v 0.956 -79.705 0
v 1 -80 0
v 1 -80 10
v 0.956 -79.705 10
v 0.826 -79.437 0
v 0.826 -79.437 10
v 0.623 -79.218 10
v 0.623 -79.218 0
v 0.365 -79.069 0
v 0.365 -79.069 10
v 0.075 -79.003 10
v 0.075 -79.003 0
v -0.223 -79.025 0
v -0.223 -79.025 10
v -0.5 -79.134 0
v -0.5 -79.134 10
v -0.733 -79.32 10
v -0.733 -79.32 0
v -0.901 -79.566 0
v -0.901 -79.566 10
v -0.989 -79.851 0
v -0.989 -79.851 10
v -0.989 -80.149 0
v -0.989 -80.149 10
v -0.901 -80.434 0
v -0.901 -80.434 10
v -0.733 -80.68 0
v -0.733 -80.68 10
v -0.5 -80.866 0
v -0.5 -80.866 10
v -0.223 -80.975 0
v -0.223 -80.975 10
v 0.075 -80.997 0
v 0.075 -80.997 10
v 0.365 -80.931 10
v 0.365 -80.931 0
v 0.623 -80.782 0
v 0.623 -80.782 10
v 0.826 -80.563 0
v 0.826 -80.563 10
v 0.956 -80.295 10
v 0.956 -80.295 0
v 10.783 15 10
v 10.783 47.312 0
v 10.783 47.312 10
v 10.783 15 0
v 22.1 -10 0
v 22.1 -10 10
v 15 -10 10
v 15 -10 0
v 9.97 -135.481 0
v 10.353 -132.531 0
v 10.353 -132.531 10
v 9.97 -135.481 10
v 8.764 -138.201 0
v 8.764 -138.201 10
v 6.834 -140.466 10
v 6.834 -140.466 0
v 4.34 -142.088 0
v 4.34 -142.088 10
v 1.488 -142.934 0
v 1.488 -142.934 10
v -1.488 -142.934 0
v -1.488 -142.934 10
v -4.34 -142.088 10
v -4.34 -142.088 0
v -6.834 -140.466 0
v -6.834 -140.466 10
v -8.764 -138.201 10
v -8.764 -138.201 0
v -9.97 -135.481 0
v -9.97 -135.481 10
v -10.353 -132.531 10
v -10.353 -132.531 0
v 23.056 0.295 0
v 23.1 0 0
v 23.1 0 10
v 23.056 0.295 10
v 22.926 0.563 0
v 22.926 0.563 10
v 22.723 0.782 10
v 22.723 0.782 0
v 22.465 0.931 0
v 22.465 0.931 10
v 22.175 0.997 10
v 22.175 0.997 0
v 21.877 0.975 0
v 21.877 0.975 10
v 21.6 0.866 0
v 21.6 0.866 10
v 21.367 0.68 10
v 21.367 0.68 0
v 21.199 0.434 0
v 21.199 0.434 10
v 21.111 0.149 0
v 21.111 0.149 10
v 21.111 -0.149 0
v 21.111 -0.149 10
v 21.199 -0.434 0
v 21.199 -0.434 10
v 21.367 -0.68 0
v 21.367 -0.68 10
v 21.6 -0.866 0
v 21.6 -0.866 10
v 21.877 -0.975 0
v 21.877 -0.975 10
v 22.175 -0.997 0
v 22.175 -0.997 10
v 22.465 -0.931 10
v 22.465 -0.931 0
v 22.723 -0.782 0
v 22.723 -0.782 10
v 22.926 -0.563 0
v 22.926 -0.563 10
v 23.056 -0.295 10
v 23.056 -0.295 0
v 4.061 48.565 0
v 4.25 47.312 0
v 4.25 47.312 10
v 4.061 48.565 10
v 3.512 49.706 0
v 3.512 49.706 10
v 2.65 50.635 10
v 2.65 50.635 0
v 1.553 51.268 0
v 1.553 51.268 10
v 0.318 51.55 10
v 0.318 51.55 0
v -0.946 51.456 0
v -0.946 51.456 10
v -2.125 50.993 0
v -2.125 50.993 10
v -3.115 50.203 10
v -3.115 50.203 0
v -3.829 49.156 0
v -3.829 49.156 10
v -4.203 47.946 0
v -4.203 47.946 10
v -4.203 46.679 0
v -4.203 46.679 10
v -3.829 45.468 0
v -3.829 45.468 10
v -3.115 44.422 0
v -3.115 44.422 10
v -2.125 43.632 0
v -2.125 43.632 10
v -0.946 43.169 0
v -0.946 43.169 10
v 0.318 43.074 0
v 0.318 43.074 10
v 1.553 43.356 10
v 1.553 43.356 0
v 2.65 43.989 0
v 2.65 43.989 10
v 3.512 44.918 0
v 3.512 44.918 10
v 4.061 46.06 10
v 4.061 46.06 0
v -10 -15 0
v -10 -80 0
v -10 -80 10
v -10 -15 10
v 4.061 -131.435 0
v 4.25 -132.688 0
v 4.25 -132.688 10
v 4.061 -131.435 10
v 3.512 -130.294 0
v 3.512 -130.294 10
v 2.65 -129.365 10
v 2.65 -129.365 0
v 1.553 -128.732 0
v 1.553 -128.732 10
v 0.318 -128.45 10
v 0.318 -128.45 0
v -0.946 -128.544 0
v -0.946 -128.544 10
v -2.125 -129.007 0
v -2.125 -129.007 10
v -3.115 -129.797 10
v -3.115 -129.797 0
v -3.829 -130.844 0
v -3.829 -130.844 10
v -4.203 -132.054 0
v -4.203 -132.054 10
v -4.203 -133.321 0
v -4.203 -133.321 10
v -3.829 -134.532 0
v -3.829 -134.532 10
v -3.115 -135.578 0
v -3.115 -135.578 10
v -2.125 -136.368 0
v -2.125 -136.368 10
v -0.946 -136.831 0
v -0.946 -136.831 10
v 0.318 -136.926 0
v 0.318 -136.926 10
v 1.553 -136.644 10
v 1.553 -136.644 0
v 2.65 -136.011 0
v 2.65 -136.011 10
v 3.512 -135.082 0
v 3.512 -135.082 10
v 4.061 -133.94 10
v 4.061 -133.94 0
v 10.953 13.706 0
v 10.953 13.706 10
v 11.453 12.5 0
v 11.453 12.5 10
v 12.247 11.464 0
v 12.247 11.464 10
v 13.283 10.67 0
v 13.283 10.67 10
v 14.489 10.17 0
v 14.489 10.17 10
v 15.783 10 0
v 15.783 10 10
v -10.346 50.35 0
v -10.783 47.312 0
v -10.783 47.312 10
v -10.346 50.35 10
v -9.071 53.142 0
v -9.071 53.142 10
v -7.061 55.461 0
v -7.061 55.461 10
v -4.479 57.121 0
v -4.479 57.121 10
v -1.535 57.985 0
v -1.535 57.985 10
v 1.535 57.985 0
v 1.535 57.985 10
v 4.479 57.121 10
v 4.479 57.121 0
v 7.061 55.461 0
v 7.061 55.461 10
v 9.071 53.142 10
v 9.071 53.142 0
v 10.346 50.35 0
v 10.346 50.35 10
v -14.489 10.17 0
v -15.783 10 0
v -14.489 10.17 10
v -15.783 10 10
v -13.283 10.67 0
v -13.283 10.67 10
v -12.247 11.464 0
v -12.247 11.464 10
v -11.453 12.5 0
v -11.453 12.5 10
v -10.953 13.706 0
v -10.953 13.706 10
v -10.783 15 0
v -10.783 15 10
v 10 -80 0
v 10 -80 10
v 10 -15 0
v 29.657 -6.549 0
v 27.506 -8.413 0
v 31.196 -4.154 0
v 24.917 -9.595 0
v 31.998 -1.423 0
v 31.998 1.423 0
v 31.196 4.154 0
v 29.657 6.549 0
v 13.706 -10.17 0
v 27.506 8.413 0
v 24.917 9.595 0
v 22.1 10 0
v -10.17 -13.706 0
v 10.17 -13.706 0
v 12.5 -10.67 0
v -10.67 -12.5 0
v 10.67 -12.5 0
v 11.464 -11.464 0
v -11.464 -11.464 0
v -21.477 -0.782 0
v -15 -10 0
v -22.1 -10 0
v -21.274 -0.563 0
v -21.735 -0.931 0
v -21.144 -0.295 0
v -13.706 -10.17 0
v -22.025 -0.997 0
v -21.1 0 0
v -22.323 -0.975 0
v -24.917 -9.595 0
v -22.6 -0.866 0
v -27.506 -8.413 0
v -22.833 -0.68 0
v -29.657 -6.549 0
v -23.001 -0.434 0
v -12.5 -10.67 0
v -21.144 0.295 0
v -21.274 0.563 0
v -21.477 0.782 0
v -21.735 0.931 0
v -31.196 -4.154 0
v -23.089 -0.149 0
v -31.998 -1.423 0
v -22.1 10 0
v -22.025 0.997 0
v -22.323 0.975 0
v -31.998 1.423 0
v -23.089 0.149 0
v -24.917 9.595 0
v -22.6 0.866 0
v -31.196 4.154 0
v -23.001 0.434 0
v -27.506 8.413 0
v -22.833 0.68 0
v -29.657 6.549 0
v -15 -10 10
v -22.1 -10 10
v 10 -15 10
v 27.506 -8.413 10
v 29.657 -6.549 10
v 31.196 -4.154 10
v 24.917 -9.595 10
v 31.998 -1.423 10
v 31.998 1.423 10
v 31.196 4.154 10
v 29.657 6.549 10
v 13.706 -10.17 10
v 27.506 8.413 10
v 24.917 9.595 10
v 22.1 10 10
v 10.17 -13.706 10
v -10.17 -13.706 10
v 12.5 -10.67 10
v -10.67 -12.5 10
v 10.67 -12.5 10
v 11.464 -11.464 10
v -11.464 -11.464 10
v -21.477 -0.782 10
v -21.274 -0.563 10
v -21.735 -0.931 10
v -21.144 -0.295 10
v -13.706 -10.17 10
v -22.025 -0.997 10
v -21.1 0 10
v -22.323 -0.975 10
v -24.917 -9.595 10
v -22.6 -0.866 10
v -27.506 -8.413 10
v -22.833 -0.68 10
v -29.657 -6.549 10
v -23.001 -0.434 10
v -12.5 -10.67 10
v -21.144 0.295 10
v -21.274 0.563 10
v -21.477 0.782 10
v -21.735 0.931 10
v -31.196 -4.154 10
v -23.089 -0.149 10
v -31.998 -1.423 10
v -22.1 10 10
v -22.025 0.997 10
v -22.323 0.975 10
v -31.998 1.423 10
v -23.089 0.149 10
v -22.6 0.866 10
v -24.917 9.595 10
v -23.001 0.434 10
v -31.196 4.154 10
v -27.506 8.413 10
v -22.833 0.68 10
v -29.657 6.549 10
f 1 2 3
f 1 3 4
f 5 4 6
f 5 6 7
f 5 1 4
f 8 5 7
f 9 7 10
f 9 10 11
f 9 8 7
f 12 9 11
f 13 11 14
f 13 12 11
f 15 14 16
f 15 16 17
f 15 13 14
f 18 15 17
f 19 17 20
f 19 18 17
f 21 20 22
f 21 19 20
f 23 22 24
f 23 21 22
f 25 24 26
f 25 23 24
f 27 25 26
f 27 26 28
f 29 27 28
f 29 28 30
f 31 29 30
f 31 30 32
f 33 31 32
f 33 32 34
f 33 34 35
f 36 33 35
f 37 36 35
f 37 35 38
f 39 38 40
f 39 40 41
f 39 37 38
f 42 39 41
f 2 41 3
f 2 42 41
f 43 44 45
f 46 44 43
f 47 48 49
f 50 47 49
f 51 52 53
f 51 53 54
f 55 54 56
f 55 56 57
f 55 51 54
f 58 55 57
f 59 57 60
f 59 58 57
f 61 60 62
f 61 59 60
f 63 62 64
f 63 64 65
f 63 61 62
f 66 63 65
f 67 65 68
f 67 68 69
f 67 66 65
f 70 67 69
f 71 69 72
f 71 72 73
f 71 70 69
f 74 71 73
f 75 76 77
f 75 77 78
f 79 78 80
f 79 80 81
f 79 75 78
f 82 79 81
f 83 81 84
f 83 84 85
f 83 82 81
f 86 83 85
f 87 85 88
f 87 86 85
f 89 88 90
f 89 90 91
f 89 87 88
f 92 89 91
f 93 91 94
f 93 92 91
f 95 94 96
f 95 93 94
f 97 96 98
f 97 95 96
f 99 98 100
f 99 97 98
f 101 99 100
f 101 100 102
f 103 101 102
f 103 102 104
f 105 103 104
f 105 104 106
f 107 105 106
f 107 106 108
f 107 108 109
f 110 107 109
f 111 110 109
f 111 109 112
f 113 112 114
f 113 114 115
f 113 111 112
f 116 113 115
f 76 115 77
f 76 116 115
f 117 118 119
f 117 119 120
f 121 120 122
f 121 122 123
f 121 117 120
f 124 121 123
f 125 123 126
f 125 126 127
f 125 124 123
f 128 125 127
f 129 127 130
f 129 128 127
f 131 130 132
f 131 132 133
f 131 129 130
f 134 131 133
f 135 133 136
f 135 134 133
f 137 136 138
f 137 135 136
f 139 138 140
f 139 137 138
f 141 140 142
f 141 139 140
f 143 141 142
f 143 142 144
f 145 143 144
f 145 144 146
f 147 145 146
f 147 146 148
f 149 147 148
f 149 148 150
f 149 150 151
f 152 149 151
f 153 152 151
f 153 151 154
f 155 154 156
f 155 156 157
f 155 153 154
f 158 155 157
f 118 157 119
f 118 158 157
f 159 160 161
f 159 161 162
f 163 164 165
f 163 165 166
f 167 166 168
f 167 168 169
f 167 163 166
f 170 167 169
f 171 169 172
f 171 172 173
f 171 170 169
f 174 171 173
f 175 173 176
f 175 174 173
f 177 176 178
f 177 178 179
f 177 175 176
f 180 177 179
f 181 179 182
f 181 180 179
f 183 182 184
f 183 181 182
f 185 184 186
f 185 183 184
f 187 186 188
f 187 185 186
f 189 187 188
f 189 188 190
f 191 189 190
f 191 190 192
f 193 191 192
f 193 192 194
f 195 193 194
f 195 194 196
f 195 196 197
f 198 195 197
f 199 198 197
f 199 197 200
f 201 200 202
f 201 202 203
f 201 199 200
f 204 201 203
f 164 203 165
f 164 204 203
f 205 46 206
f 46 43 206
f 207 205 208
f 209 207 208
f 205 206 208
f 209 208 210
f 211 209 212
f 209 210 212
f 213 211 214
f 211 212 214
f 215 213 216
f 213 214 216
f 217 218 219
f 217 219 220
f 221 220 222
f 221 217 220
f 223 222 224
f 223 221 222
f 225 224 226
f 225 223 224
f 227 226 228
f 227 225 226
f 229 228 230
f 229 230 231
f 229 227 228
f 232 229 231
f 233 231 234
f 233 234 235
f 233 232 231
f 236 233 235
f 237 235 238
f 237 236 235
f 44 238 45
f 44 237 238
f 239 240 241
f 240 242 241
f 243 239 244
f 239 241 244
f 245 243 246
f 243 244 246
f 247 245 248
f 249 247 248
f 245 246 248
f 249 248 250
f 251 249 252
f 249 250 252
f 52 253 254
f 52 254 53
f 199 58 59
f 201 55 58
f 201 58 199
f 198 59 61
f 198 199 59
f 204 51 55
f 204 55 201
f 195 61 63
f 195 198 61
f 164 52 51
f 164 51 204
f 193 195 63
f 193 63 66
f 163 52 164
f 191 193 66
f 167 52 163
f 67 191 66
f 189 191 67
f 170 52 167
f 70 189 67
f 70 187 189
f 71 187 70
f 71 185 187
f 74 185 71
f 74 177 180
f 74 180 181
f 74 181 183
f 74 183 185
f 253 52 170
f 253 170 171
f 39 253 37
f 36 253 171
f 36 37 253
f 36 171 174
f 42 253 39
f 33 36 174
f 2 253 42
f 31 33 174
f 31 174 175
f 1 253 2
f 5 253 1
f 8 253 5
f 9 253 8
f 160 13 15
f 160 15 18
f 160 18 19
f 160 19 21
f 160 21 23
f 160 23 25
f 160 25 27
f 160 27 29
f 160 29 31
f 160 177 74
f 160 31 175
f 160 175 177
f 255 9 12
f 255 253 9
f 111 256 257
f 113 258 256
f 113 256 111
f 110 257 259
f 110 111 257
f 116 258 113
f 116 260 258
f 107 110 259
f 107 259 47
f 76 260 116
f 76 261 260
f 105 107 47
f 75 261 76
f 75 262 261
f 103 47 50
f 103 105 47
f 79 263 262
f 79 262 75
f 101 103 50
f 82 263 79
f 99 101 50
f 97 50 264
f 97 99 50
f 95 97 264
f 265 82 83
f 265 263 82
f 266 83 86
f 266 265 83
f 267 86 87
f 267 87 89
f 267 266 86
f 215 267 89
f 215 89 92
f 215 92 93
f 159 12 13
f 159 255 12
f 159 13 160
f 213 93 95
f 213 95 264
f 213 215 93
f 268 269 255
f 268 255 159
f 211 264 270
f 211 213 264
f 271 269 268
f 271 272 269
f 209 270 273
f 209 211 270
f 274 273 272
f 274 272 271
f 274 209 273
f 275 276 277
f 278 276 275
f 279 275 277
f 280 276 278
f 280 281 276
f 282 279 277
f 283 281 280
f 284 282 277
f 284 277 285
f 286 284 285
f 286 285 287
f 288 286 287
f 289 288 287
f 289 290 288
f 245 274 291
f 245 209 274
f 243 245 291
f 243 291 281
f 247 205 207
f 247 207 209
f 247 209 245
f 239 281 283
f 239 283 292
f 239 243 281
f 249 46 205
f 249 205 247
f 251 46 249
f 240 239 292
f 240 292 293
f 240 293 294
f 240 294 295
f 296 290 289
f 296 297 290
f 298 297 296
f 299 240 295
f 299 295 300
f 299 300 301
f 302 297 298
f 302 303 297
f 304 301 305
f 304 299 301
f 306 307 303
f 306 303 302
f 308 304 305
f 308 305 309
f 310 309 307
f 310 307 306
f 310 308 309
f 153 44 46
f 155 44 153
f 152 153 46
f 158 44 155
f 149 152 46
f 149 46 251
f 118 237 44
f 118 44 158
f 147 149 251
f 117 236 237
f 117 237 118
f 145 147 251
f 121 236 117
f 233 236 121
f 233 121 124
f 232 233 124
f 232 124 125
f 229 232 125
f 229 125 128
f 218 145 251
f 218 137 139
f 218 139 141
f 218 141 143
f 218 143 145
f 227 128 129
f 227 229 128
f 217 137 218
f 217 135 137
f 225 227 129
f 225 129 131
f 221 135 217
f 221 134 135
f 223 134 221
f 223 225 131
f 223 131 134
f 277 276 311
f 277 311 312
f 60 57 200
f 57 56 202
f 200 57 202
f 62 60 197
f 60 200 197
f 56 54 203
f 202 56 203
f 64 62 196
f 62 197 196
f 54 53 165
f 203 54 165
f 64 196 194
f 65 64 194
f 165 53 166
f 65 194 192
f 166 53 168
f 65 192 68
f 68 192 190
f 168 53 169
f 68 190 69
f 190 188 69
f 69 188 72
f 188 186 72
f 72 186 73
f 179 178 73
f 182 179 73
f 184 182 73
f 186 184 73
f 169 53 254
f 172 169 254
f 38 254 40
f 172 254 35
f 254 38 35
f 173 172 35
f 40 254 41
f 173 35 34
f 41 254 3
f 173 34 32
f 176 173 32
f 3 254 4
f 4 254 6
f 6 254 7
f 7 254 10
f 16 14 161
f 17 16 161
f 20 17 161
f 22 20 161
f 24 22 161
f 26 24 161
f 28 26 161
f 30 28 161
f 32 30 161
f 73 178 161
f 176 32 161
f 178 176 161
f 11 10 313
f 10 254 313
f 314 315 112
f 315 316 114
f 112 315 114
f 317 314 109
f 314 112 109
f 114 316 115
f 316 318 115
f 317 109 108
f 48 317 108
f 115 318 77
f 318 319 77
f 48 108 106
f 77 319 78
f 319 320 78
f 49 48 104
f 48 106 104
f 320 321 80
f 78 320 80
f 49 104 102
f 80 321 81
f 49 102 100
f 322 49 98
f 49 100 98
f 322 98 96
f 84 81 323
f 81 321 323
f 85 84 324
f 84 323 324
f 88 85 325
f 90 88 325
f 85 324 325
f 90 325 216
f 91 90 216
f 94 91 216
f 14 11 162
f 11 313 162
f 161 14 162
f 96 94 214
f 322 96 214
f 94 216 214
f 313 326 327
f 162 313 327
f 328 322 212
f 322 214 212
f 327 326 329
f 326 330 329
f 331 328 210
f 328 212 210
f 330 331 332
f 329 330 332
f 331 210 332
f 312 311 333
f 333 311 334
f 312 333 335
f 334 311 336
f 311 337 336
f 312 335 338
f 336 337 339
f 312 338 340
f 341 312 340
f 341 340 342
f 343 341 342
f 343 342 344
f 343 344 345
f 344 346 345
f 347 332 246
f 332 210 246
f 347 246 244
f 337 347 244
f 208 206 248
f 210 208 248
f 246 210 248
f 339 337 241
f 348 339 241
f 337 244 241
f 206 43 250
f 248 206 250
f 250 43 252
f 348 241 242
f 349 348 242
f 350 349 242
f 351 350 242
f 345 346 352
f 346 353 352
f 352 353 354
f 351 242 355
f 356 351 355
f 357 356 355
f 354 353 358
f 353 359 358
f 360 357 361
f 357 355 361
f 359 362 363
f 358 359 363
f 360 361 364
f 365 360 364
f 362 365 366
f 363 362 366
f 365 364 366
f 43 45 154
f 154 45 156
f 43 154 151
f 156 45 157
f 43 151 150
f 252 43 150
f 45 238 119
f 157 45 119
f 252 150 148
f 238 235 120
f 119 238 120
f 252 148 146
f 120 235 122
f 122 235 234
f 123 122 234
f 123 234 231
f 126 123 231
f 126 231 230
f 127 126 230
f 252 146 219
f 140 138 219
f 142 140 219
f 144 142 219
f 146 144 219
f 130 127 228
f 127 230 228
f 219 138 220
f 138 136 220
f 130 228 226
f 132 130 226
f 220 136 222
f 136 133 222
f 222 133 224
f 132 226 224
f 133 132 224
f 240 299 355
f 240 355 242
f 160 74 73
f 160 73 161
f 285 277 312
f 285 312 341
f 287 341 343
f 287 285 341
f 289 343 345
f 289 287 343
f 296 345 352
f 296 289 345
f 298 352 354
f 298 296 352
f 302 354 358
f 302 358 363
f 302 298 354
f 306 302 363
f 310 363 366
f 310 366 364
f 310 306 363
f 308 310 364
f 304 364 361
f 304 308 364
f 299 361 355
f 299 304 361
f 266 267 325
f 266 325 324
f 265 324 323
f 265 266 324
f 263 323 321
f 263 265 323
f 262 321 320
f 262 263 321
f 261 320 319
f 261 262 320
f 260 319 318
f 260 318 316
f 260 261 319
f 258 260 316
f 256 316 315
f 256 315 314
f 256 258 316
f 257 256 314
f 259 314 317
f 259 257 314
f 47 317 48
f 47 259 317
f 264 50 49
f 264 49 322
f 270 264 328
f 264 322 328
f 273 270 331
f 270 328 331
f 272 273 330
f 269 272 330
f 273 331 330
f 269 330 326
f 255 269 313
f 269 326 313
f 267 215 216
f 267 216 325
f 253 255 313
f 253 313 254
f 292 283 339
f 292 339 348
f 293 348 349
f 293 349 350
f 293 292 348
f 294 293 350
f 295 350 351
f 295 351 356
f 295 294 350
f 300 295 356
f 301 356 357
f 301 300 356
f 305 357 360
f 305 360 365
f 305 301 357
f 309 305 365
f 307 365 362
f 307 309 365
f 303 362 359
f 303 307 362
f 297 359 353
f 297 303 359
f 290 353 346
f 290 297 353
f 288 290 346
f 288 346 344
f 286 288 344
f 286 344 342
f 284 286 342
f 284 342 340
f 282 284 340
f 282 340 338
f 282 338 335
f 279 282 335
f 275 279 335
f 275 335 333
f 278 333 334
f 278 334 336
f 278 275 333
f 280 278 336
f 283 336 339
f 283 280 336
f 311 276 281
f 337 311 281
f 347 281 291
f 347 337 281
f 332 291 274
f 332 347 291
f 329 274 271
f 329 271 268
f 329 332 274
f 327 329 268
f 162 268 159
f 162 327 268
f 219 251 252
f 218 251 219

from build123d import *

# Parameters (mm, degrees)
SKETCH1_R           = 1
SKETCH1_R_2         = 4.25
BOSS_EXTRUDE1_DEPTH = 10
FILLET1_R           = 5


with BuildPart() as part:
    # Sketch1 → Boss-Extrude1 (new body)
    with BuildSketch(Plane.XY):
        with BuildLine():
            Line((-22.1, 10), (-10.782884141, 10))
            Line((-10.782884141, 10), (-10.782884141, 47.312260738))
            ThreePointArc((-10.782884141, 47.312260738), (0, 58.095144879), (10.782884141, 47.312260738))
            Line((10.782884141, 47.312260738), (10.782884141, 10))
            Line((10.782884141, 10), (22.1, 10))
            ThreePointArc((22.1, 10), (32.1, 0), (22.1, -10))
            Line((22.1, -10), (10, -10))
            Line((10, -10), (10, -80))
            Line((10, -80), (10.352856736, -132.530872001))
            ThreePointArc((10.352856736, -132.530872001), (0, -143.041784363), (-10.352856736, -132.530872001))
            Line((-10.352856736, -132.530872001), (-10, -80))
            Line((-10, -80), (-10, -10))
            Line((-10, -10), (-22.1, -10))
            ThreePointArc((-22.1, -10), (-32.1, 0), (-22.1, 10))
        make_face()
        with Locations((-22.1, 0)):
            Circle(SKETCH1_R, mode=Mode.SUBTRACT)
        with Locations((22.1, 0)):
            Circle(SKETCH1_R, mode=Mode.SUBTRACT)
        with Locations((0, -80)):
            Circle(SKETCH1_R, mode=Mode.SUBTRACT)
        with Locations((0, 47.312260738)):
            Circle(SKETCH1_R_2, mode=Mode.SUBTRACT)
        with Locations((0, -132.687739262)):
            Circle(SKETCH1_R_2, mode=Mode.SUBTRACT)
    extrude(amount=BOSS_EXTRUDE1_DEPTH)

    # Fillet1
    fillet1_edges = [part.edges().sort_by_distance(p)[0] for p in [
        (-10.782884141, 10, 5),
        (10.782884141, 10, 5),
        (10, -10, 5),
        (-10, -10, 5),
    ]]
    fillet(fillet1_edges, radius=FILLET1_R)


solid = part.part
